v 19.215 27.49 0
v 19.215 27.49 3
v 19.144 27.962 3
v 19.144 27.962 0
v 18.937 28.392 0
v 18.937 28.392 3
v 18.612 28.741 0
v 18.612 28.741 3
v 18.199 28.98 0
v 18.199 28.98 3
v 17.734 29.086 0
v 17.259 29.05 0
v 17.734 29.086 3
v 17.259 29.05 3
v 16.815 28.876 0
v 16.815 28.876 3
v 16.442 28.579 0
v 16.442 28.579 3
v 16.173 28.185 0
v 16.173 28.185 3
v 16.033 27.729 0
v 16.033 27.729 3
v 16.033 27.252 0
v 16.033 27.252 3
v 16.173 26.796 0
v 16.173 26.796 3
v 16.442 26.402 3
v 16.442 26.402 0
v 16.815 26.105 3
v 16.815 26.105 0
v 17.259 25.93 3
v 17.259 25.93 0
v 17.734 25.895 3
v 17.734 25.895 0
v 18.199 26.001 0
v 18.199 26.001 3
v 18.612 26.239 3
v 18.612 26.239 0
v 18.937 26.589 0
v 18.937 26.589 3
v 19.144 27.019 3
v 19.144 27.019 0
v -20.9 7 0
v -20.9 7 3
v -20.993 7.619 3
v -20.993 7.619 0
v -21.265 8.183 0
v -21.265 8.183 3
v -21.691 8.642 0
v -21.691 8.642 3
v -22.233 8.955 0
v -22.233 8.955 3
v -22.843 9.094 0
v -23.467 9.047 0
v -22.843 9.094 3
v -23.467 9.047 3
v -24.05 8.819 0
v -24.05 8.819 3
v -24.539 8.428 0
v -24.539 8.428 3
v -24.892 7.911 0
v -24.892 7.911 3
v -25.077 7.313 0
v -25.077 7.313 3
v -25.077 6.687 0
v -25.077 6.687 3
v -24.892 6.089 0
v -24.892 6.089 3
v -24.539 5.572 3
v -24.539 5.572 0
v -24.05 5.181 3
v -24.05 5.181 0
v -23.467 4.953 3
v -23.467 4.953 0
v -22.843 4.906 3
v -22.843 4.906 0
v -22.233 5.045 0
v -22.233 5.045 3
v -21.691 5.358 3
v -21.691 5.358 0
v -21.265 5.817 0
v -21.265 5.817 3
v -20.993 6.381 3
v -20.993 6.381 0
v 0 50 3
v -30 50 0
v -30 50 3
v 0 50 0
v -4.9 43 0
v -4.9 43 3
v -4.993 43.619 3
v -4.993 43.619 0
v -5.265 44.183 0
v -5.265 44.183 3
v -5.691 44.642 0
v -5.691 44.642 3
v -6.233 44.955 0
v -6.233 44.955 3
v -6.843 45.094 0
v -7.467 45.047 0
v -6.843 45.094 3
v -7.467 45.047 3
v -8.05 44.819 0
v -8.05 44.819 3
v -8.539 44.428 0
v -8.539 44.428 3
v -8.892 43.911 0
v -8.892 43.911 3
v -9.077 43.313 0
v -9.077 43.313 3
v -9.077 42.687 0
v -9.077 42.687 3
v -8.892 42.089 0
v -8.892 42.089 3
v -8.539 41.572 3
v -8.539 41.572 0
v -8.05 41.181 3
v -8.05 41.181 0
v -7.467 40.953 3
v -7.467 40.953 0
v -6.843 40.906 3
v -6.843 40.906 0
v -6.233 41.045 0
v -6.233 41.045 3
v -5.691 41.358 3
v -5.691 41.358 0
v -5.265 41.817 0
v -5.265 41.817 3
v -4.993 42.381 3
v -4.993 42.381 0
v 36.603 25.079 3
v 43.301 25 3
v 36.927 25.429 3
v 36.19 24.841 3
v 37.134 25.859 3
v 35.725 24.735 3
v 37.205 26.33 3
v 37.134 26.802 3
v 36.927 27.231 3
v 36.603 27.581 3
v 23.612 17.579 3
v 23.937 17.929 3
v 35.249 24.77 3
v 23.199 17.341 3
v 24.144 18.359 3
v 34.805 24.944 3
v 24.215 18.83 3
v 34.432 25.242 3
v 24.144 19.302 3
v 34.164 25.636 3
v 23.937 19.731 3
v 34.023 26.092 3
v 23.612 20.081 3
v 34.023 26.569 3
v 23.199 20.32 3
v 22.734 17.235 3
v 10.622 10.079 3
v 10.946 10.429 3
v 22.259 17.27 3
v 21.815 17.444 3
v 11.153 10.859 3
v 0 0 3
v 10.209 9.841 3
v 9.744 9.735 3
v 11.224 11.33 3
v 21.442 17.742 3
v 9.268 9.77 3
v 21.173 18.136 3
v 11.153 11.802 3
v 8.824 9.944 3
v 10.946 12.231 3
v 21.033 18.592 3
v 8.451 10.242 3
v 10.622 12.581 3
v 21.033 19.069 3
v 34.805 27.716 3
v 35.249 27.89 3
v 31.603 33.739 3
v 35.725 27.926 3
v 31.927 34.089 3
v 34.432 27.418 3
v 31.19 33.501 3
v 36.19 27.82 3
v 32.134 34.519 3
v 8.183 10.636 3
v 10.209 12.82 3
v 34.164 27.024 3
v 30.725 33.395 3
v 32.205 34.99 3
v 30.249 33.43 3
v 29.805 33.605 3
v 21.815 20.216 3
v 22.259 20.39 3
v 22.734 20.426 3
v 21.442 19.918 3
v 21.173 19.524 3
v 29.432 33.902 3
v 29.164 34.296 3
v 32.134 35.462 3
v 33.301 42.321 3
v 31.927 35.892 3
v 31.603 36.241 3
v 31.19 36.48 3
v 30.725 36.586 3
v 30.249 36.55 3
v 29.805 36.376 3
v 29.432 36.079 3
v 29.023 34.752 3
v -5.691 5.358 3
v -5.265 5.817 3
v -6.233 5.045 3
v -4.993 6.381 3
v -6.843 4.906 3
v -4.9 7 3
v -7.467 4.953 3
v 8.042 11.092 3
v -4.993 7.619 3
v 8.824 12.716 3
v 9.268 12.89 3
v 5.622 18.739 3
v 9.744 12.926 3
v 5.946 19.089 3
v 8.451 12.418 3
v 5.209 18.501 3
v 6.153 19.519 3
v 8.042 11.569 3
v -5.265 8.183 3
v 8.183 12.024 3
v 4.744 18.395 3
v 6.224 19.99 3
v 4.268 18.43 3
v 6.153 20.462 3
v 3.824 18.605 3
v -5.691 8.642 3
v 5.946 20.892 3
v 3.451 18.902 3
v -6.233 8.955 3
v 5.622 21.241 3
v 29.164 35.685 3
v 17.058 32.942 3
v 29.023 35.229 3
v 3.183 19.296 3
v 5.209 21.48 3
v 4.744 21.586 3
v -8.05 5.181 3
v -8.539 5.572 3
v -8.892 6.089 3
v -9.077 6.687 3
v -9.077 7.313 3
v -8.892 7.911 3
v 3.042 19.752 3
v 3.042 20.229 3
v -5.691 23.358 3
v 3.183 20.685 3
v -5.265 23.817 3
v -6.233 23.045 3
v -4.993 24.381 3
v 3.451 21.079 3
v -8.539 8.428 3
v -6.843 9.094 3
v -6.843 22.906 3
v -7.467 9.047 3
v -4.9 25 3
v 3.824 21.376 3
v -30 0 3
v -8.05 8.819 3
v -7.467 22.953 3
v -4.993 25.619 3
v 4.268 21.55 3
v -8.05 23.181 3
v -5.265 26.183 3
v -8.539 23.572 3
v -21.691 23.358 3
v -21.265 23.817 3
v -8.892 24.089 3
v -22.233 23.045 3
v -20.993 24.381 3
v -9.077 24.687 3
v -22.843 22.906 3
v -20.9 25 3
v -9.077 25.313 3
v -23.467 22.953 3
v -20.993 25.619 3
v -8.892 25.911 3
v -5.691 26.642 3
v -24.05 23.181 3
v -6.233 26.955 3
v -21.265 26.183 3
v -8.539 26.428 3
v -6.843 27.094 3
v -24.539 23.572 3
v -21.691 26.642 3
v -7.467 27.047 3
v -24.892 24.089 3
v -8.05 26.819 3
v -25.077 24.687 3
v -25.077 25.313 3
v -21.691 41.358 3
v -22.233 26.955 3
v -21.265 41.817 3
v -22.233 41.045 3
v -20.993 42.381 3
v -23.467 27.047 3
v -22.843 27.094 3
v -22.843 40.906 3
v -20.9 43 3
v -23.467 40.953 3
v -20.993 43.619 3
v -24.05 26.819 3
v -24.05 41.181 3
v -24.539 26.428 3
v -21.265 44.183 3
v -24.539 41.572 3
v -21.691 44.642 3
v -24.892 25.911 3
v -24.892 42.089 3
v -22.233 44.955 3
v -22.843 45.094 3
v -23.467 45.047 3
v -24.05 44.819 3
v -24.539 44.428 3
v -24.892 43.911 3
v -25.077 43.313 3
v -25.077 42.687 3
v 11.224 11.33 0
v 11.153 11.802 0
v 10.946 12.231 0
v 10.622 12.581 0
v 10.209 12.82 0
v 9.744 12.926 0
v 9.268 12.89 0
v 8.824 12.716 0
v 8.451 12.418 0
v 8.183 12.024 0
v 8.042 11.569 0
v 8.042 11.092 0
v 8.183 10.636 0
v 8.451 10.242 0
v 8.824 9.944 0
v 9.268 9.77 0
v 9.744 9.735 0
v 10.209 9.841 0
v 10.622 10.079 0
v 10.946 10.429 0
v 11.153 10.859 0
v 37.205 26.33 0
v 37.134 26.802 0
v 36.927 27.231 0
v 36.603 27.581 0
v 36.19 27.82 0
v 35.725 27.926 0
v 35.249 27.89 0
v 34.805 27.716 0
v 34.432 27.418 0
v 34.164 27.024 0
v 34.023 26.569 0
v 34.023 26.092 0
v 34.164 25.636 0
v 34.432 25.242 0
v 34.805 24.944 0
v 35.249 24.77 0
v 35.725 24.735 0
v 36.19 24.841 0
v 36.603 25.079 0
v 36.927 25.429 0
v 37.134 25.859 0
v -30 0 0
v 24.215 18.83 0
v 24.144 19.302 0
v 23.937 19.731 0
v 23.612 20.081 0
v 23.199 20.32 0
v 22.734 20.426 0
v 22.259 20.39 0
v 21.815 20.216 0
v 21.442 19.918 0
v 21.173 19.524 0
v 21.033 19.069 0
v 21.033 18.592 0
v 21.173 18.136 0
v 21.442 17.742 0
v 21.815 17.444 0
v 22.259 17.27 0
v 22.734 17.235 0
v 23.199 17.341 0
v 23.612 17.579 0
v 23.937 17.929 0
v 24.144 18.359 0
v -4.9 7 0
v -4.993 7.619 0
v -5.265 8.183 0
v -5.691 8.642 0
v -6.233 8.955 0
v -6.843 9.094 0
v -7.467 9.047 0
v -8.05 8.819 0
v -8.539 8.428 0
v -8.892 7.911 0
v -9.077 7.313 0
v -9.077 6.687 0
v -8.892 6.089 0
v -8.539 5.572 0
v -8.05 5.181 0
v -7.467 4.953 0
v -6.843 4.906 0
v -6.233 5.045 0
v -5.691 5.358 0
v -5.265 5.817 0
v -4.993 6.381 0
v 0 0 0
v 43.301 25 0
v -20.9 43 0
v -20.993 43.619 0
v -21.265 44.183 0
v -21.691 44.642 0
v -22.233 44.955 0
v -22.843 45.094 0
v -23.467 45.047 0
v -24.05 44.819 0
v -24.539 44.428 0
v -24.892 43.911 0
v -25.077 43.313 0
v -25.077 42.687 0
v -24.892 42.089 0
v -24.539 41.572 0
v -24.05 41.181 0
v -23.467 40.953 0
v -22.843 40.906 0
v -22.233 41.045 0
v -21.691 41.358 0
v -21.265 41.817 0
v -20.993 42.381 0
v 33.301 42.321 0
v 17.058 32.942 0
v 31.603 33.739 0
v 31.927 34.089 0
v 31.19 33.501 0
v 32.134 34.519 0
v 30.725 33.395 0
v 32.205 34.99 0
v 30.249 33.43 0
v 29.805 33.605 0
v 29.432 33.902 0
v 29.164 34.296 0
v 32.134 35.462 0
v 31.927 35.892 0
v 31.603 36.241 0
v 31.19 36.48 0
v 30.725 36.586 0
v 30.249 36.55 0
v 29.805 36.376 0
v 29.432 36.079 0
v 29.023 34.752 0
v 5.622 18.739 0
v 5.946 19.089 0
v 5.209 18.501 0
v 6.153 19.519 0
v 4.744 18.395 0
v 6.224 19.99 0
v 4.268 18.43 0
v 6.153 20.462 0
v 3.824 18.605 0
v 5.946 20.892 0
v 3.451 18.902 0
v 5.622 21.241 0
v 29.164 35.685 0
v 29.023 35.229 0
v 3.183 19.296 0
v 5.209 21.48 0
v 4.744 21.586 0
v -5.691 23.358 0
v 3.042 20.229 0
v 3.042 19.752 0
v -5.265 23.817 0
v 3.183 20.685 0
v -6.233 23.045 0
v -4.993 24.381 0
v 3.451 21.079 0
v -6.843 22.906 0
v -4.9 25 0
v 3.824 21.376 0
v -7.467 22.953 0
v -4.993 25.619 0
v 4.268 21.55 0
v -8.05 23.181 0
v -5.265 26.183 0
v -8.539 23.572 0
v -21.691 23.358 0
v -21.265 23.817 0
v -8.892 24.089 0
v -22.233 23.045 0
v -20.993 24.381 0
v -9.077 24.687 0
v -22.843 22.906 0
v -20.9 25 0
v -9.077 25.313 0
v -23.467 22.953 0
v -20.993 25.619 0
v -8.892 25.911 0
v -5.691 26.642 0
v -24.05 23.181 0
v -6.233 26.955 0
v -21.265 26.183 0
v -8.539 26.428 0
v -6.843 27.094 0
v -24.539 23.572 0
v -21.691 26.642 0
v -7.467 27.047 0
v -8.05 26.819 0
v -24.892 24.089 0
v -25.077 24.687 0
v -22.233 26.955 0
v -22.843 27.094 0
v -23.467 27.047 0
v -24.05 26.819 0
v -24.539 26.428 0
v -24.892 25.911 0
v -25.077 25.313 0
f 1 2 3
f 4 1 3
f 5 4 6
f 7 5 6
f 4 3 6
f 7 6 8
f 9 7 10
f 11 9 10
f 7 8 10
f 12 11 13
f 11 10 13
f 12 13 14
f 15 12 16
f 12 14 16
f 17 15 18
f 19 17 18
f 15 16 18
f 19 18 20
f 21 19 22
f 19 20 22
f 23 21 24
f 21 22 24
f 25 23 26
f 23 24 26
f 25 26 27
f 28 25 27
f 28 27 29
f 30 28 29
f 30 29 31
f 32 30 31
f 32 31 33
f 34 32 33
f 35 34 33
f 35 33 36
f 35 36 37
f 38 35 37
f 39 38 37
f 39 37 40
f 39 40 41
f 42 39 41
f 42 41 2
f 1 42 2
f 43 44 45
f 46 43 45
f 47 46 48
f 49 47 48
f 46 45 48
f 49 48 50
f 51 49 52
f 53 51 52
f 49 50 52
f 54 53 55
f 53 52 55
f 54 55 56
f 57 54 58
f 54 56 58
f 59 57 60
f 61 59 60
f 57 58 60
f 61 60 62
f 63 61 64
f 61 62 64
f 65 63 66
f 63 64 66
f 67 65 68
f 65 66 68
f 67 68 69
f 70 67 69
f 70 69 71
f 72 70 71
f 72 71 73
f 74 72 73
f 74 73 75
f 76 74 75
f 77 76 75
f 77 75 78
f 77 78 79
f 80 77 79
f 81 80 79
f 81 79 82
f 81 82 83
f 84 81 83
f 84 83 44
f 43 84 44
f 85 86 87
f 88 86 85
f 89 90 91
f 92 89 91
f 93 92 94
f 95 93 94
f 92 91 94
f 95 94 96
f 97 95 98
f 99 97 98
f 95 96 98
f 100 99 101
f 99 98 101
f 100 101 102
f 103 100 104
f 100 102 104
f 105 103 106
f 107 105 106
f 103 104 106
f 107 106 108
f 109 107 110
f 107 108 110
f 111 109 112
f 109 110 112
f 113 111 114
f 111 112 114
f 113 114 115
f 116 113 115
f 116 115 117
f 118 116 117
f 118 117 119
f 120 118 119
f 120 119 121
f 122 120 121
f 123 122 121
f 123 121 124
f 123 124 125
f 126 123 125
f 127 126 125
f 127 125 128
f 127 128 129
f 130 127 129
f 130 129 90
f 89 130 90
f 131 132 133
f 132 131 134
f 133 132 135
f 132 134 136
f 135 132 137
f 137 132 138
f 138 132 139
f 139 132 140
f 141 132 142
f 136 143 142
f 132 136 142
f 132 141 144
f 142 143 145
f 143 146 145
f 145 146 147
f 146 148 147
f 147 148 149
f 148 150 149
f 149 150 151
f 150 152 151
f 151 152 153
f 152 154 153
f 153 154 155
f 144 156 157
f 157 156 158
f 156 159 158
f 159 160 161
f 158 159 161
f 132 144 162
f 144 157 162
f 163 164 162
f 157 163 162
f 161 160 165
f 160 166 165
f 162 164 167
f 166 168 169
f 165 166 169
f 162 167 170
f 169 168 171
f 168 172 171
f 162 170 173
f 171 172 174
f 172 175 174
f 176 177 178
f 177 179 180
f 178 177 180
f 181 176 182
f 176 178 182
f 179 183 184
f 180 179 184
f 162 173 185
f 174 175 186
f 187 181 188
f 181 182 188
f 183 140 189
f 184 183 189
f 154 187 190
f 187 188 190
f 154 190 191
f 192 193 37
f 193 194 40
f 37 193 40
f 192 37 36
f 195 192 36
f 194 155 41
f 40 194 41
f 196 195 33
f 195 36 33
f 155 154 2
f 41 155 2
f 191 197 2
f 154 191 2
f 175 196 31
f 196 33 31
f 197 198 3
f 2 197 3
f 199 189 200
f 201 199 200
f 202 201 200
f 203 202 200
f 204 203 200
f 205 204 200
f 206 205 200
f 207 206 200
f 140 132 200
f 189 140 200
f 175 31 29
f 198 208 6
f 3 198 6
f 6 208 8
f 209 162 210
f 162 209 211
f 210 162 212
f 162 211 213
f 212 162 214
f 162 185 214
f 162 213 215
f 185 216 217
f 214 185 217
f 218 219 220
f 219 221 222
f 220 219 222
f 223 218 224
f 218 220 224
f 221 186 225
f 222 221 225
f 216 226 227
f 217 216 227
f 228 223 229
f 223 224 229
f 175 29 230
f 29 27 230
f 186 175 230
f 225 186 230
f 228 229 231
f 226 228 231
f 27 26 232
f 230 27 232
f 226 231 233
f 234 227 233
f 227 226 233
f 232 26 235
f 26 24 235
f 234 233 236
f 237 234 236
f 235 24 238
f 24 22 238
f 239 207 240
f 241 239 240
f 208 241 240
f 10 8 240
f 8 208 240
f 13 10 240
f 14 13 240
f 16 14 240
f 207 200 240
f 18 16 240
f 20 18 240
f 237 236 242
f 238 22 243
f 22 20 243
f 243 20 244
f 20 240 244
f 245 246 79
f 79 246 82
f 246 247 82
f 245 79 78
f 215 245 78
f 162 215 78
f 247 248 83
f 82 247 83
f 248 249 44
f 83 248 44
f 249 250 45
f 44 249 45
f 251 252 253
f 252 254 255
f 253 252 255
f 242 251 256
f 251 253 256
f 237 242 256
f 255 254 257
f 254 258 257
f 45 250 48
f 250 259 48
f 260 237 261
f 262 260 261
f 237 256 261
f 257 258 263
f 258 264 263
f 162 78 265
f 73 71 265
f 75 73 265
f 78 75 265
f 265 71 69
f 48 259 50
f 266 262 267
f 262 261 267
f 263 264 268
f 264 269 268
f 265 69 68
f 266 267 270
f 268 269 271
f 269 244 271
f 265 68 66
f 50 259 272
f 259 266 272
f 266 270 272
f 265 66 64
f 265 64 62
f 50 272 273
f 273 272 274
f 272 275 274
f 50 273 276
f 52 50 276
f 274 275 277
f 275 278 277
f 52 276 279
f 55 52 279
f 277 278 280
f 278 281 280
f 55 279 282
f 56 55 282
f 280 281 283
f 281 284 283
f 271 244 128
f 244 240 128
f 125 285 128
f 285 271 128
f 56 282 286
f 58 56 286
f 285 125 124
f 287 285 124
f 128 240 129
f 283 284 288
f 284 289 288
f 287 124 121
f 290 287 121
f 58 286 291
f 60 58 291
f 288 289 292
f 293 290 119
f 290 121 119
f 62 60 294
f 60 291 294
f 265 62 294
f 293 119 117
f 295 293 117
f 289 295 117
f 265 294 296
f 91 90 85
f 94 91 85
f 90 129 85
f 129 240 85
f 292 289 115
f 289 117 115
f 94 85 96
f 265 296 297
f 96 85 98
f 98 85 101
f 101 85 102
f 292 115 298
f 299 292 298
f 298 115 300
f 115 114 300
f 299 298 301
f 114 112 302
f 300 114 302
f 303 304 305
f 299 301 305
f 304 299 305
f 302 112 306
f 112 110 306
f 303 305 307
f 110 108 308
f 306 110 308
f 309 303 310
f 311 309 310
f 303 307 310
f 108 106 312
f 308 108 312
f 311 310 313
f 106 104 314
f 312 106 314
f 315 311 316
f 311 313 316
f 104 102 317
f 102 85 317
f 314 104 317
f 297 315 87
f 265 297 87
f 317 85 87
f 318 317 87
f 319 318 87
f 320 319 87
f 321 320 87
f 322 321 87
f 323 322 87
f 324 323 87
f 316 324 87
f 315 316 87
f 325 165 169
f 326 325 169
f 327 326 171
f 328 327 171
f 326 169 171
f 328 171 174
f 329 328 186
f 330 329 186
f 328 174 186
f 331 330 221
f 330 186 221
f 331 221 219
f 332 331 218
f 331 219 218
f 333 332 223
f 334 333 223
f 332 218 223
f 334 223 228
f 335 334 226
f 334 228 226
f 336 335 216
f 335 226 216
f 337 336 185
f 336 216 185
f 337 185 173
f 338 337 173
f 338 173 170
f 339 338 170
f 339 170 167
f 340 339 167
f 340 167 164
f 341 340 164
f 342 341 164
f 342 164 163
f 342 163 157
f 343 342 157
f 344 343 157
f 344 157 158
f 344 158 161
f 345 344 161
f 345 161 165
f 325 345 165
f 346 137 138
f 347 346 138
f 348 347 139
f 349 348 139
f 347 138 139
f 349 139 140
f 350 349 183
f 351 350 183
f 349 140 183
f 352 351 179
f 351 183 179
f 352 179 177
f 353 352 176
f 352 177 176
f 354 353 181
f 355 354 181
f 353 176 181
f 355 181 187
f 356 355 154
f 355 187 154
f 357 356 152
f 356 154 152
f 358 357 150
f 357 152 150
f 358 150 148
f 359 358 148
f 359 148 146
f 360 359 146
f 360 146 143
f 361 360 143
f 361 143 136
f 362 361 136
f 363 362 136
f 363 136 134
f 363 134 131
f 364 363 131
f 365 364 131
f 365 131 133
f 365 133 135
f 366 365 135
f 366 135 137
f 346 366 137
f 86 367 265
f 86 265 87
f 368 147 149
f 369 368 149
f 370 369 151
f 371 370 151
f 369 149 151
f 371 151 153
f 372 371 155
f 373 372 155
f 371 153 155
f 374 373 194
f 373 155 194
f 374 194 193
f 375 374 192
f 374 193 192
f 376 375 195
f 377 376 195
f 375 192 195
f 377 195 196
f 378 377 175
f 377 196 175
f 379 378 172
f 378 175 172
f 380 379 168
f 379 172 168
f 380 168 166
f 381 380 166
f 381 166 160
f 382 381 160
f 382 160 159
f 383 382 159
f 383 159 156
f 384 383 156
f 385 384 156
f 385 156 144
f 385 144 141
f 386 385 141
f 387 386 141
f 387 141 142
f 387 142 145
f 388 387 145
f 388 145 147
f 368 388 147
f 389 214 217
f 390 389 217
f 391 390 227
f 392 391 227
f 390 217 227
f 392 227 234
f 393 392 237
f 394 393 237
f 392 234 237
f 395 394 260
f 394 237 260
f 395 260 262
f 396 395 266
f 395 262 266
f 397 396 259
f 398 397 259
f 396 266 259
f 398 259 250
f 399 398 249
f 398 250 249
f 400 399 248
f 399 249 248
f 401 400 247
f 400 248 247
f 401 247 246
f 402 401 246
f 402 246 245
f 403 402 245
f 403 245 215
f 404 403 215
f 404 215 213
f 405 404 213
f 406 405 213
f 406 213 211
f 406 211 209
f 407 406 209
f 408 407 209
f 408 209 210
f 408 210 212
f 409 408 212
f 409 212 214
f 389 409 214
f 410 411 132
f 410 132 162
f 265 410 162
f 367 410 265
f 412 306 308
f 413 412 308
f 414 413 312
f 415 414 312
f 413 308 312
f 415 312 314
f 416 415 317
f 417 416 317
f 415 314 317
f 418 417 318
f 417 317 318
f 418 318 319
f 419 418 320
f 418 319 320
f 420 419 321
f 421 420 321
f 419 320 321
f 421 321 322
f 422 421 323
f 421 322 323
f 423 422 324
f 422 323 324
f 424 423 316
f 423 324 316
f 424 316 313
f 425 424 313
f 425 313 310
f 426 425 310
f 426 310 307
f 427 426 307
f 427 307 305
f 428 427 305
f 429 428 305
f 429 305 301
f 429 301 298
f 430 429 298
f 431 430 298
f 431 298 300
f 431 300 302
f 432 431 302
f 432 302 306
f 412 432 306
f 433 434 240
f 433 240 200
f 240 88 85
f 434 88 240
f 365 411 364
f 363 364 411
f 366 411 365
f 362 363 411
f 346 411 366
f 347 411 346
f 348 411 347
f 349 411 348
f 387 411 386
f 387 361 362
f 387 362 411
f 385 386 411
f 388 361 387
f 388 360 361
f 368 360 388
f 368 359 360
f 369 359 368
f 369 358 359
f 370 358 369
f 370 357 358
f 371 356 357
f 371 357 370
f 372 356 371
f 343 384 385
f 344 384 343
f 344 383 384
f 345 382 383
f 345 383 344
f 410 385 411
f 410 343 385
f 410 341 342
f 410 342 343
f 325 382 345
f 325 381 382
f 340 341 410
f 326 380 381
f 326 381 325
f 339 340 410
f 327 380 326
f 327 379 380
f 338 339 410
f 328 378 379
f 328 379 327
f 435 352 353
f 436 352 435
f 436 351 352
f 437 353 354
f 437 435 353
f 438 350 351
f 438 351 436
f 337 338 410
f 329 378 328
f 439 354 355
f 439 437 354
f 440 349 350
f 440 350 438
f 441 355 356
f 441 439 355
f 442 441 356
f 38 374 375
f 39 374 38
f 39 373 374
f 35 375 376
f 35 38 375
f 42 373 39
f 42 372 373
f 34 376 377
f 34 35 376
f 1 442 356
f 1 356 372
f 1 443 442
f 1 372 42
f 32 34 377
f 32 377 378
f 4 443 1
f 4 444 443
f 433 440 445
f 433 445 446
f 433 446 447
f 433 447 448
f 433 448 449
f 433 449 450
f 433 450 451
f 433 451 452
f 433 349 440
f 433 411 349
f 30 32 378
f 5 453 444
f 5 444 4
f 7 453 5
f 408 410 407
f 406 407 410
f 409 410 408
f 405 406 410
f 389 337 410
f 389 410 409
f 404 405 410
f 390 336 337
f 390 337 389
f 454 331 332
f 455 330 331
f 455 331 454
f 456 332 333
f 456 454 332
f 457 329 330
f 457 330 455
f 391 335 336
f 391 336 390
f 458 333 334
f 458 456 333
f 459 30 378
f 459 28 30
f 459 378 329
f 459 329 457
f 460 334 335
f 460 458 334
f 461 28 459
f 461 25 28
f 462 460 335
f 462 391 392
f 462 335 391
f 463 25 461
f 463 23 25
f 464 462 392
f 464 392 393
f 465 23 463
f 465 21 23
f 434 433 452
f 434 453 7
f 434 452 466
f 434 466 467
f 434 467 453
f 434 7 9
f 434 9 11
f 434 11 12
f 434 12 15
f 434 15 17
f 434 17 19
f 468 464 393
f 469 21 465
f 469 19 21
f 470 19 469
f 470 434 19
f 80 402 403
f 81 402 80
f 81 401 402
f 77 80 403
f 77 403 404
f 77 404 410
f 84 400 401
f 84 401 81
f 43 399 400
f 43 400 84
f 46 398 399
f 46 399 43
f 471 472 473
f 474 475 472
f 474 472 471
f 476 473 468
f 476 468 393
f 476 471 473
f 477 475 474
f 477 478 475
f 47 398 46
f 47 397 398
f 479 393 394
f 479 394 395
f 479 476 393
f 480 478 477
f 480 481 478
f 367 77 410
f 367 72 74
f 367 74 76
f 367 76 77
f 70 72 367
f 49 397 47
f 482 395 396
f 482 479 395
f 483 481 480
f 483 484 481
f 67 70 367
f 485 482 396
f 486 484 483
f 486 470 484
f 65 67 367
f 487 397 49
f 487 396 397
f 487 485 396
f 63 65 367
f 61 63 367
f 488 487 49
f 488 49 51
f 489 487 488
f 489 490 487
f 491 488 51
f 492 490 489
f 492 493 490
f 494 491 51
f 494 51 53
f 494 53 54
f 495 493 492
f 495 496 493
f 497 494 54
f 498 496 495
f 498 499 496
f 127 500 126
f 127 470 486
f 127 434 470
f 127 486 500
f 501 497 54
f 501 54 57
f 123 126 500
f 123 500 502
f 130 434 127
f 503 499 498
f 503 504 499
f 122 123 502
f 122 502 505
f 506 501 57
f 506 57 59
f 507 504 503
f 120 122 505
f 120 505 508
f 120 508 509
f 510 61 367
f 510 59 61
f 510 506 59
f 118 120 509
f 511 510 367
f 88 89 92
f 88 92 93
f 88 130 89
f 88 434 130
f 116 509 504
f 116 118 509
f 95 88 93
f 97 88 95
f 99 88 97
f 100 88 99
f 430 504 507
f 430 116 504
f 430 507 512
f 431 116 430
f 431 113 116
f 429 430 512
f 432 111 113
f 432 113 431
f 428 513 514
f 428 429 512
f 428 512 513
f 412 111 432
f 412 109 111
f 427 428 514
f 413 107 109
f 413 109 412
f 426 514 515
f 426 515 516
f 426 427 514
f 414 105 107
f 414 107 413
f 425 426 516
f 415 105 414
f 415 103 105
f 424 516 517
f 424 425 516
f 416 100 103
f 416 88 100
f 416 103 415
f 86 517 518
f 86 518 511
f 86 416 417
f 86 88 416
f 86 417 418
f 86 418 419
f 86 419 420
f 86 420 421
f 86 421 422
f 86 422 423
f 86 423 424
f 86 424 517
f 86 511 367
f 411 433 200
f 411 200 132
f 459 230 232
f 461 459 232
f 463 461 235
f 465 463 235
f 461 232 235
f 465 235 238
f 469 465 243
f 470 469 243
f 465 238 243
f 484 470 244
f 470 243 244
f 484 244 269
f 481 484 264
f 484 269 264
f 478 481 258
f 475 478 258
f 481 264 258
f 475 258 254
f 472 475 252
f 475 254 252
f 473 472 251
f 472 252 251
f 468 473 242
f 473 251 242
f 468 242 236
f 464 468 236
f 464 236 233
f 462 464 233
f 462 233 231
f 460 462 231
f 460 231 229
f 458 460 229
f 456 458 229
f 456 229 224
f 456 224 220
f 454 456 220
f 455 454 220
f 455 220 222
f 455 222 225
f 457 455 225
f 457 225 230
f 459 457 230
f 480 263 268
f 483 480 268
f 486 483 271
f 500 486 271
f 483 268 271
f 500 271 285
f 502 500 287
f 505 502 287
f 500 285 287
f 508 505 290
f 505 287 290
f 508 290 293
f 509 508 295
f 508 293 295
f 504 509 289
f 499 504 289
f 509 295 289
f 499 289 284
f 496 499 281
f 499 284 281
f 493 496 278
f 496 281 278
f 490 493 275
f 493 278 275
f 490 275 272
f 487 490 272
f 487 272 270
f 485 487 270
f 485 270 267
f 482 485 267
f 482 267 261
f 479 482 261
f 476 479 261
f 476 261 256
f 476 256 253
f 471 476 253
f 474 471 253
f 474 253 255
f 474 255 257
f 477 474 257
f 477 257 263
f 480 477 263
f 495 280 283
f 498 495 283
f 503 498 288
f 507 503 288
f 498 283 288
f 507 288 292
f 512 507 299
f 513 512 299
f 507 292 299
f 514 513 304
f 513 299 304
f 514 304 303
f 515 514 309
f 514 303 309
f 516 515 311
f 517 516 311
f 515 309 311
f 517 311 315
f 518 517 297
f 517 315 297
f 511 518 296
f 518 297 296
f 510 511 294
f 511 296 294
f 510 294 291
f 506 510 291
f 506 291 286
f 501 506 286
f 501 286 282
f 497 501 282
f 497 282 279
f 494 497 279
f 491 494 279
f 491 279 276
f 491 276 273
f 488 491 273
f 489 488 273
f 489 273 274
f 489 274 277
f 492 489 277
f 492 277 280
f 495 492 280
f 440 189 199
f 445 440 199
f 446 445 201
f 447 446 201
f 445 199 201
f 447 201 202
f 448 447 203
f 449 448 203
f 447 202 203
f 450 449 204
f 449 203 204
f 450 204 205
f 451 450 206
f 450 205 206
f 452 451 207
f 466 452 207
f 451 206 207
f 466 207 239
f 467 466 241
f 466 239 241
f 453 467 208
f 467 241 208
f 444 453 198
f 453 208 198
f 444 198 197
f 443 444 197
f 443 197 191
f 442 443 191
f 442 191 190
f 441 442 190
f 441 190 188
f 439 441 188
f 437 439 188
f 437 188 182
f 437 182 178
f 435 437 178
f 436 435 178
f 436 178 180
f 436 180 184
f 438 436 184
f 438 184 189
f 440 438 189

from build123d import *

# Parameters (mm, degrees)
EXTRUDE_1_DEPTH     = 3
SKETCH_2_R          = 2.1
SKETCH_2_R_2        = 1.6
CUT_EXTRUDE_1_DEPTH = 67.211781429


with BuildPart() as part:
    # 草图1 → 凸台-拉伸1 (new body)
    with BuildSketch(Plane.XY):
        Polygon((0, 0), (-30, 0), (-30, 50), (0, 50), (17.057713659, 32.942286341), (33.301270189, 42.320508076), (43.301270189, 25), align=None)
    extrude(amount=EXTRUDE_1_DEPTH)

    # 草图2 → 切除-拉伸1 (cut, through all)
    with BuildSketch(Plane.XY.offset(3)):
        with Locations((-23, 43)):
            Circle(SKETCH_2_R)
        with Locations((-7, 43)):
            Circle(SKETCH_2_R)
        with Locations((-23, 7)):
            Circle(SKETCH_2_R)
        with Locations((-7, 7)):
            Circle(SKETCH_2_R)
        with Locations((-23, 25)):
            Circle(SKETCH_2_R)
        with Locations((-7, 25)):
            Circle(SKETCH_2_R)
        with Locations((30.605117767, 34.990381057)):
            Circle(SKETCH_2_R_2)
        with Locations((35.605117767, 26.330127019)):
            Circle(SKETCH_2_R_2)
        with Locations((22.61473671, 18.830127019)):
            Circle(SKETCH_2_R_2)
        with Locations((17.61473671, 27.490381057)):
            Circle(SKETCH_2_R_2)
        with Locations((4.624355653, 19.990381057)):
            Circle(SKETCH_2_R_2)
        with Locations((9.624355653, 11.330127019)):
            Circle(SKETCH_2_R_2)
    extrude(amount=-CUT_EXTRUDE_1_DEPTH, mode=Mode.SUBTRACT)


solid = part.part
